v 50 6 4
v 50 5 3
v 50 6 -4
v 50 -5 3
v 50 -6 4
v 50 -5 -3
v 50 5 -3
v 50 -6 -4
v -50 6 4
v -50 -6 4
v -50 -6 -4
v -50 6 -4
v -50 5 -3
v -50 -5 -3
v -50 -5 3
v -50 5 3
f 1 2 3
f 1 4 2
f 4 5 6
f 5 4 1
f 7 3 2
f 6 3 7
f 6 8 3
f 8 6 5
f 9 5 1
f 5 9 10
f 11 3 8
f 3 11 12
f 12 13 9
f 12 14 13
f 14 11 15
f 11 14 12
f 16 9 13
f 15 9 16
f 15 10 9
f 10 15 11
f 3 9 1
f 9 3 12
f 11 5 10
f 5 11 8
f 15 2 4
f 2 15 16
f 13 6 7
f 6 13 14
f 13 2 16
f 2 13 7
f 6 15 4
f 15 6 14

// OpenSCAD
// Aluminium rectangular box section: 12mm x 8mm x 1mm wall
// Length L along X, 12mm along Y, 8mm along Z.

L = 100;  //[50:200:1]
W = 12;   //[6:24:1]
H = 8;    //[4:16:1]
t = 1;    //[0.5:2:0.1]

// Small extra length so the inner cut cleanly opens both ends
eps = 0.5;

module box_section(L, W, H, t) {
    // Ensure valid wall thickness (avoid negative/zero inner dims)
    innerW = max(W - 2*t, 0.01);
    innerH = max(H - 2*t, 0.01);

    // Centered tube so end views clearly show the hollow opening
    difference() {
        cube([L, W, H], center=true);
        cube([L + 2*eps, innerW, innerH], center=true);
    }
}

union() {
    color([0.75, 0.75, 0.75])
        box_section(L, W, H, t);
}
